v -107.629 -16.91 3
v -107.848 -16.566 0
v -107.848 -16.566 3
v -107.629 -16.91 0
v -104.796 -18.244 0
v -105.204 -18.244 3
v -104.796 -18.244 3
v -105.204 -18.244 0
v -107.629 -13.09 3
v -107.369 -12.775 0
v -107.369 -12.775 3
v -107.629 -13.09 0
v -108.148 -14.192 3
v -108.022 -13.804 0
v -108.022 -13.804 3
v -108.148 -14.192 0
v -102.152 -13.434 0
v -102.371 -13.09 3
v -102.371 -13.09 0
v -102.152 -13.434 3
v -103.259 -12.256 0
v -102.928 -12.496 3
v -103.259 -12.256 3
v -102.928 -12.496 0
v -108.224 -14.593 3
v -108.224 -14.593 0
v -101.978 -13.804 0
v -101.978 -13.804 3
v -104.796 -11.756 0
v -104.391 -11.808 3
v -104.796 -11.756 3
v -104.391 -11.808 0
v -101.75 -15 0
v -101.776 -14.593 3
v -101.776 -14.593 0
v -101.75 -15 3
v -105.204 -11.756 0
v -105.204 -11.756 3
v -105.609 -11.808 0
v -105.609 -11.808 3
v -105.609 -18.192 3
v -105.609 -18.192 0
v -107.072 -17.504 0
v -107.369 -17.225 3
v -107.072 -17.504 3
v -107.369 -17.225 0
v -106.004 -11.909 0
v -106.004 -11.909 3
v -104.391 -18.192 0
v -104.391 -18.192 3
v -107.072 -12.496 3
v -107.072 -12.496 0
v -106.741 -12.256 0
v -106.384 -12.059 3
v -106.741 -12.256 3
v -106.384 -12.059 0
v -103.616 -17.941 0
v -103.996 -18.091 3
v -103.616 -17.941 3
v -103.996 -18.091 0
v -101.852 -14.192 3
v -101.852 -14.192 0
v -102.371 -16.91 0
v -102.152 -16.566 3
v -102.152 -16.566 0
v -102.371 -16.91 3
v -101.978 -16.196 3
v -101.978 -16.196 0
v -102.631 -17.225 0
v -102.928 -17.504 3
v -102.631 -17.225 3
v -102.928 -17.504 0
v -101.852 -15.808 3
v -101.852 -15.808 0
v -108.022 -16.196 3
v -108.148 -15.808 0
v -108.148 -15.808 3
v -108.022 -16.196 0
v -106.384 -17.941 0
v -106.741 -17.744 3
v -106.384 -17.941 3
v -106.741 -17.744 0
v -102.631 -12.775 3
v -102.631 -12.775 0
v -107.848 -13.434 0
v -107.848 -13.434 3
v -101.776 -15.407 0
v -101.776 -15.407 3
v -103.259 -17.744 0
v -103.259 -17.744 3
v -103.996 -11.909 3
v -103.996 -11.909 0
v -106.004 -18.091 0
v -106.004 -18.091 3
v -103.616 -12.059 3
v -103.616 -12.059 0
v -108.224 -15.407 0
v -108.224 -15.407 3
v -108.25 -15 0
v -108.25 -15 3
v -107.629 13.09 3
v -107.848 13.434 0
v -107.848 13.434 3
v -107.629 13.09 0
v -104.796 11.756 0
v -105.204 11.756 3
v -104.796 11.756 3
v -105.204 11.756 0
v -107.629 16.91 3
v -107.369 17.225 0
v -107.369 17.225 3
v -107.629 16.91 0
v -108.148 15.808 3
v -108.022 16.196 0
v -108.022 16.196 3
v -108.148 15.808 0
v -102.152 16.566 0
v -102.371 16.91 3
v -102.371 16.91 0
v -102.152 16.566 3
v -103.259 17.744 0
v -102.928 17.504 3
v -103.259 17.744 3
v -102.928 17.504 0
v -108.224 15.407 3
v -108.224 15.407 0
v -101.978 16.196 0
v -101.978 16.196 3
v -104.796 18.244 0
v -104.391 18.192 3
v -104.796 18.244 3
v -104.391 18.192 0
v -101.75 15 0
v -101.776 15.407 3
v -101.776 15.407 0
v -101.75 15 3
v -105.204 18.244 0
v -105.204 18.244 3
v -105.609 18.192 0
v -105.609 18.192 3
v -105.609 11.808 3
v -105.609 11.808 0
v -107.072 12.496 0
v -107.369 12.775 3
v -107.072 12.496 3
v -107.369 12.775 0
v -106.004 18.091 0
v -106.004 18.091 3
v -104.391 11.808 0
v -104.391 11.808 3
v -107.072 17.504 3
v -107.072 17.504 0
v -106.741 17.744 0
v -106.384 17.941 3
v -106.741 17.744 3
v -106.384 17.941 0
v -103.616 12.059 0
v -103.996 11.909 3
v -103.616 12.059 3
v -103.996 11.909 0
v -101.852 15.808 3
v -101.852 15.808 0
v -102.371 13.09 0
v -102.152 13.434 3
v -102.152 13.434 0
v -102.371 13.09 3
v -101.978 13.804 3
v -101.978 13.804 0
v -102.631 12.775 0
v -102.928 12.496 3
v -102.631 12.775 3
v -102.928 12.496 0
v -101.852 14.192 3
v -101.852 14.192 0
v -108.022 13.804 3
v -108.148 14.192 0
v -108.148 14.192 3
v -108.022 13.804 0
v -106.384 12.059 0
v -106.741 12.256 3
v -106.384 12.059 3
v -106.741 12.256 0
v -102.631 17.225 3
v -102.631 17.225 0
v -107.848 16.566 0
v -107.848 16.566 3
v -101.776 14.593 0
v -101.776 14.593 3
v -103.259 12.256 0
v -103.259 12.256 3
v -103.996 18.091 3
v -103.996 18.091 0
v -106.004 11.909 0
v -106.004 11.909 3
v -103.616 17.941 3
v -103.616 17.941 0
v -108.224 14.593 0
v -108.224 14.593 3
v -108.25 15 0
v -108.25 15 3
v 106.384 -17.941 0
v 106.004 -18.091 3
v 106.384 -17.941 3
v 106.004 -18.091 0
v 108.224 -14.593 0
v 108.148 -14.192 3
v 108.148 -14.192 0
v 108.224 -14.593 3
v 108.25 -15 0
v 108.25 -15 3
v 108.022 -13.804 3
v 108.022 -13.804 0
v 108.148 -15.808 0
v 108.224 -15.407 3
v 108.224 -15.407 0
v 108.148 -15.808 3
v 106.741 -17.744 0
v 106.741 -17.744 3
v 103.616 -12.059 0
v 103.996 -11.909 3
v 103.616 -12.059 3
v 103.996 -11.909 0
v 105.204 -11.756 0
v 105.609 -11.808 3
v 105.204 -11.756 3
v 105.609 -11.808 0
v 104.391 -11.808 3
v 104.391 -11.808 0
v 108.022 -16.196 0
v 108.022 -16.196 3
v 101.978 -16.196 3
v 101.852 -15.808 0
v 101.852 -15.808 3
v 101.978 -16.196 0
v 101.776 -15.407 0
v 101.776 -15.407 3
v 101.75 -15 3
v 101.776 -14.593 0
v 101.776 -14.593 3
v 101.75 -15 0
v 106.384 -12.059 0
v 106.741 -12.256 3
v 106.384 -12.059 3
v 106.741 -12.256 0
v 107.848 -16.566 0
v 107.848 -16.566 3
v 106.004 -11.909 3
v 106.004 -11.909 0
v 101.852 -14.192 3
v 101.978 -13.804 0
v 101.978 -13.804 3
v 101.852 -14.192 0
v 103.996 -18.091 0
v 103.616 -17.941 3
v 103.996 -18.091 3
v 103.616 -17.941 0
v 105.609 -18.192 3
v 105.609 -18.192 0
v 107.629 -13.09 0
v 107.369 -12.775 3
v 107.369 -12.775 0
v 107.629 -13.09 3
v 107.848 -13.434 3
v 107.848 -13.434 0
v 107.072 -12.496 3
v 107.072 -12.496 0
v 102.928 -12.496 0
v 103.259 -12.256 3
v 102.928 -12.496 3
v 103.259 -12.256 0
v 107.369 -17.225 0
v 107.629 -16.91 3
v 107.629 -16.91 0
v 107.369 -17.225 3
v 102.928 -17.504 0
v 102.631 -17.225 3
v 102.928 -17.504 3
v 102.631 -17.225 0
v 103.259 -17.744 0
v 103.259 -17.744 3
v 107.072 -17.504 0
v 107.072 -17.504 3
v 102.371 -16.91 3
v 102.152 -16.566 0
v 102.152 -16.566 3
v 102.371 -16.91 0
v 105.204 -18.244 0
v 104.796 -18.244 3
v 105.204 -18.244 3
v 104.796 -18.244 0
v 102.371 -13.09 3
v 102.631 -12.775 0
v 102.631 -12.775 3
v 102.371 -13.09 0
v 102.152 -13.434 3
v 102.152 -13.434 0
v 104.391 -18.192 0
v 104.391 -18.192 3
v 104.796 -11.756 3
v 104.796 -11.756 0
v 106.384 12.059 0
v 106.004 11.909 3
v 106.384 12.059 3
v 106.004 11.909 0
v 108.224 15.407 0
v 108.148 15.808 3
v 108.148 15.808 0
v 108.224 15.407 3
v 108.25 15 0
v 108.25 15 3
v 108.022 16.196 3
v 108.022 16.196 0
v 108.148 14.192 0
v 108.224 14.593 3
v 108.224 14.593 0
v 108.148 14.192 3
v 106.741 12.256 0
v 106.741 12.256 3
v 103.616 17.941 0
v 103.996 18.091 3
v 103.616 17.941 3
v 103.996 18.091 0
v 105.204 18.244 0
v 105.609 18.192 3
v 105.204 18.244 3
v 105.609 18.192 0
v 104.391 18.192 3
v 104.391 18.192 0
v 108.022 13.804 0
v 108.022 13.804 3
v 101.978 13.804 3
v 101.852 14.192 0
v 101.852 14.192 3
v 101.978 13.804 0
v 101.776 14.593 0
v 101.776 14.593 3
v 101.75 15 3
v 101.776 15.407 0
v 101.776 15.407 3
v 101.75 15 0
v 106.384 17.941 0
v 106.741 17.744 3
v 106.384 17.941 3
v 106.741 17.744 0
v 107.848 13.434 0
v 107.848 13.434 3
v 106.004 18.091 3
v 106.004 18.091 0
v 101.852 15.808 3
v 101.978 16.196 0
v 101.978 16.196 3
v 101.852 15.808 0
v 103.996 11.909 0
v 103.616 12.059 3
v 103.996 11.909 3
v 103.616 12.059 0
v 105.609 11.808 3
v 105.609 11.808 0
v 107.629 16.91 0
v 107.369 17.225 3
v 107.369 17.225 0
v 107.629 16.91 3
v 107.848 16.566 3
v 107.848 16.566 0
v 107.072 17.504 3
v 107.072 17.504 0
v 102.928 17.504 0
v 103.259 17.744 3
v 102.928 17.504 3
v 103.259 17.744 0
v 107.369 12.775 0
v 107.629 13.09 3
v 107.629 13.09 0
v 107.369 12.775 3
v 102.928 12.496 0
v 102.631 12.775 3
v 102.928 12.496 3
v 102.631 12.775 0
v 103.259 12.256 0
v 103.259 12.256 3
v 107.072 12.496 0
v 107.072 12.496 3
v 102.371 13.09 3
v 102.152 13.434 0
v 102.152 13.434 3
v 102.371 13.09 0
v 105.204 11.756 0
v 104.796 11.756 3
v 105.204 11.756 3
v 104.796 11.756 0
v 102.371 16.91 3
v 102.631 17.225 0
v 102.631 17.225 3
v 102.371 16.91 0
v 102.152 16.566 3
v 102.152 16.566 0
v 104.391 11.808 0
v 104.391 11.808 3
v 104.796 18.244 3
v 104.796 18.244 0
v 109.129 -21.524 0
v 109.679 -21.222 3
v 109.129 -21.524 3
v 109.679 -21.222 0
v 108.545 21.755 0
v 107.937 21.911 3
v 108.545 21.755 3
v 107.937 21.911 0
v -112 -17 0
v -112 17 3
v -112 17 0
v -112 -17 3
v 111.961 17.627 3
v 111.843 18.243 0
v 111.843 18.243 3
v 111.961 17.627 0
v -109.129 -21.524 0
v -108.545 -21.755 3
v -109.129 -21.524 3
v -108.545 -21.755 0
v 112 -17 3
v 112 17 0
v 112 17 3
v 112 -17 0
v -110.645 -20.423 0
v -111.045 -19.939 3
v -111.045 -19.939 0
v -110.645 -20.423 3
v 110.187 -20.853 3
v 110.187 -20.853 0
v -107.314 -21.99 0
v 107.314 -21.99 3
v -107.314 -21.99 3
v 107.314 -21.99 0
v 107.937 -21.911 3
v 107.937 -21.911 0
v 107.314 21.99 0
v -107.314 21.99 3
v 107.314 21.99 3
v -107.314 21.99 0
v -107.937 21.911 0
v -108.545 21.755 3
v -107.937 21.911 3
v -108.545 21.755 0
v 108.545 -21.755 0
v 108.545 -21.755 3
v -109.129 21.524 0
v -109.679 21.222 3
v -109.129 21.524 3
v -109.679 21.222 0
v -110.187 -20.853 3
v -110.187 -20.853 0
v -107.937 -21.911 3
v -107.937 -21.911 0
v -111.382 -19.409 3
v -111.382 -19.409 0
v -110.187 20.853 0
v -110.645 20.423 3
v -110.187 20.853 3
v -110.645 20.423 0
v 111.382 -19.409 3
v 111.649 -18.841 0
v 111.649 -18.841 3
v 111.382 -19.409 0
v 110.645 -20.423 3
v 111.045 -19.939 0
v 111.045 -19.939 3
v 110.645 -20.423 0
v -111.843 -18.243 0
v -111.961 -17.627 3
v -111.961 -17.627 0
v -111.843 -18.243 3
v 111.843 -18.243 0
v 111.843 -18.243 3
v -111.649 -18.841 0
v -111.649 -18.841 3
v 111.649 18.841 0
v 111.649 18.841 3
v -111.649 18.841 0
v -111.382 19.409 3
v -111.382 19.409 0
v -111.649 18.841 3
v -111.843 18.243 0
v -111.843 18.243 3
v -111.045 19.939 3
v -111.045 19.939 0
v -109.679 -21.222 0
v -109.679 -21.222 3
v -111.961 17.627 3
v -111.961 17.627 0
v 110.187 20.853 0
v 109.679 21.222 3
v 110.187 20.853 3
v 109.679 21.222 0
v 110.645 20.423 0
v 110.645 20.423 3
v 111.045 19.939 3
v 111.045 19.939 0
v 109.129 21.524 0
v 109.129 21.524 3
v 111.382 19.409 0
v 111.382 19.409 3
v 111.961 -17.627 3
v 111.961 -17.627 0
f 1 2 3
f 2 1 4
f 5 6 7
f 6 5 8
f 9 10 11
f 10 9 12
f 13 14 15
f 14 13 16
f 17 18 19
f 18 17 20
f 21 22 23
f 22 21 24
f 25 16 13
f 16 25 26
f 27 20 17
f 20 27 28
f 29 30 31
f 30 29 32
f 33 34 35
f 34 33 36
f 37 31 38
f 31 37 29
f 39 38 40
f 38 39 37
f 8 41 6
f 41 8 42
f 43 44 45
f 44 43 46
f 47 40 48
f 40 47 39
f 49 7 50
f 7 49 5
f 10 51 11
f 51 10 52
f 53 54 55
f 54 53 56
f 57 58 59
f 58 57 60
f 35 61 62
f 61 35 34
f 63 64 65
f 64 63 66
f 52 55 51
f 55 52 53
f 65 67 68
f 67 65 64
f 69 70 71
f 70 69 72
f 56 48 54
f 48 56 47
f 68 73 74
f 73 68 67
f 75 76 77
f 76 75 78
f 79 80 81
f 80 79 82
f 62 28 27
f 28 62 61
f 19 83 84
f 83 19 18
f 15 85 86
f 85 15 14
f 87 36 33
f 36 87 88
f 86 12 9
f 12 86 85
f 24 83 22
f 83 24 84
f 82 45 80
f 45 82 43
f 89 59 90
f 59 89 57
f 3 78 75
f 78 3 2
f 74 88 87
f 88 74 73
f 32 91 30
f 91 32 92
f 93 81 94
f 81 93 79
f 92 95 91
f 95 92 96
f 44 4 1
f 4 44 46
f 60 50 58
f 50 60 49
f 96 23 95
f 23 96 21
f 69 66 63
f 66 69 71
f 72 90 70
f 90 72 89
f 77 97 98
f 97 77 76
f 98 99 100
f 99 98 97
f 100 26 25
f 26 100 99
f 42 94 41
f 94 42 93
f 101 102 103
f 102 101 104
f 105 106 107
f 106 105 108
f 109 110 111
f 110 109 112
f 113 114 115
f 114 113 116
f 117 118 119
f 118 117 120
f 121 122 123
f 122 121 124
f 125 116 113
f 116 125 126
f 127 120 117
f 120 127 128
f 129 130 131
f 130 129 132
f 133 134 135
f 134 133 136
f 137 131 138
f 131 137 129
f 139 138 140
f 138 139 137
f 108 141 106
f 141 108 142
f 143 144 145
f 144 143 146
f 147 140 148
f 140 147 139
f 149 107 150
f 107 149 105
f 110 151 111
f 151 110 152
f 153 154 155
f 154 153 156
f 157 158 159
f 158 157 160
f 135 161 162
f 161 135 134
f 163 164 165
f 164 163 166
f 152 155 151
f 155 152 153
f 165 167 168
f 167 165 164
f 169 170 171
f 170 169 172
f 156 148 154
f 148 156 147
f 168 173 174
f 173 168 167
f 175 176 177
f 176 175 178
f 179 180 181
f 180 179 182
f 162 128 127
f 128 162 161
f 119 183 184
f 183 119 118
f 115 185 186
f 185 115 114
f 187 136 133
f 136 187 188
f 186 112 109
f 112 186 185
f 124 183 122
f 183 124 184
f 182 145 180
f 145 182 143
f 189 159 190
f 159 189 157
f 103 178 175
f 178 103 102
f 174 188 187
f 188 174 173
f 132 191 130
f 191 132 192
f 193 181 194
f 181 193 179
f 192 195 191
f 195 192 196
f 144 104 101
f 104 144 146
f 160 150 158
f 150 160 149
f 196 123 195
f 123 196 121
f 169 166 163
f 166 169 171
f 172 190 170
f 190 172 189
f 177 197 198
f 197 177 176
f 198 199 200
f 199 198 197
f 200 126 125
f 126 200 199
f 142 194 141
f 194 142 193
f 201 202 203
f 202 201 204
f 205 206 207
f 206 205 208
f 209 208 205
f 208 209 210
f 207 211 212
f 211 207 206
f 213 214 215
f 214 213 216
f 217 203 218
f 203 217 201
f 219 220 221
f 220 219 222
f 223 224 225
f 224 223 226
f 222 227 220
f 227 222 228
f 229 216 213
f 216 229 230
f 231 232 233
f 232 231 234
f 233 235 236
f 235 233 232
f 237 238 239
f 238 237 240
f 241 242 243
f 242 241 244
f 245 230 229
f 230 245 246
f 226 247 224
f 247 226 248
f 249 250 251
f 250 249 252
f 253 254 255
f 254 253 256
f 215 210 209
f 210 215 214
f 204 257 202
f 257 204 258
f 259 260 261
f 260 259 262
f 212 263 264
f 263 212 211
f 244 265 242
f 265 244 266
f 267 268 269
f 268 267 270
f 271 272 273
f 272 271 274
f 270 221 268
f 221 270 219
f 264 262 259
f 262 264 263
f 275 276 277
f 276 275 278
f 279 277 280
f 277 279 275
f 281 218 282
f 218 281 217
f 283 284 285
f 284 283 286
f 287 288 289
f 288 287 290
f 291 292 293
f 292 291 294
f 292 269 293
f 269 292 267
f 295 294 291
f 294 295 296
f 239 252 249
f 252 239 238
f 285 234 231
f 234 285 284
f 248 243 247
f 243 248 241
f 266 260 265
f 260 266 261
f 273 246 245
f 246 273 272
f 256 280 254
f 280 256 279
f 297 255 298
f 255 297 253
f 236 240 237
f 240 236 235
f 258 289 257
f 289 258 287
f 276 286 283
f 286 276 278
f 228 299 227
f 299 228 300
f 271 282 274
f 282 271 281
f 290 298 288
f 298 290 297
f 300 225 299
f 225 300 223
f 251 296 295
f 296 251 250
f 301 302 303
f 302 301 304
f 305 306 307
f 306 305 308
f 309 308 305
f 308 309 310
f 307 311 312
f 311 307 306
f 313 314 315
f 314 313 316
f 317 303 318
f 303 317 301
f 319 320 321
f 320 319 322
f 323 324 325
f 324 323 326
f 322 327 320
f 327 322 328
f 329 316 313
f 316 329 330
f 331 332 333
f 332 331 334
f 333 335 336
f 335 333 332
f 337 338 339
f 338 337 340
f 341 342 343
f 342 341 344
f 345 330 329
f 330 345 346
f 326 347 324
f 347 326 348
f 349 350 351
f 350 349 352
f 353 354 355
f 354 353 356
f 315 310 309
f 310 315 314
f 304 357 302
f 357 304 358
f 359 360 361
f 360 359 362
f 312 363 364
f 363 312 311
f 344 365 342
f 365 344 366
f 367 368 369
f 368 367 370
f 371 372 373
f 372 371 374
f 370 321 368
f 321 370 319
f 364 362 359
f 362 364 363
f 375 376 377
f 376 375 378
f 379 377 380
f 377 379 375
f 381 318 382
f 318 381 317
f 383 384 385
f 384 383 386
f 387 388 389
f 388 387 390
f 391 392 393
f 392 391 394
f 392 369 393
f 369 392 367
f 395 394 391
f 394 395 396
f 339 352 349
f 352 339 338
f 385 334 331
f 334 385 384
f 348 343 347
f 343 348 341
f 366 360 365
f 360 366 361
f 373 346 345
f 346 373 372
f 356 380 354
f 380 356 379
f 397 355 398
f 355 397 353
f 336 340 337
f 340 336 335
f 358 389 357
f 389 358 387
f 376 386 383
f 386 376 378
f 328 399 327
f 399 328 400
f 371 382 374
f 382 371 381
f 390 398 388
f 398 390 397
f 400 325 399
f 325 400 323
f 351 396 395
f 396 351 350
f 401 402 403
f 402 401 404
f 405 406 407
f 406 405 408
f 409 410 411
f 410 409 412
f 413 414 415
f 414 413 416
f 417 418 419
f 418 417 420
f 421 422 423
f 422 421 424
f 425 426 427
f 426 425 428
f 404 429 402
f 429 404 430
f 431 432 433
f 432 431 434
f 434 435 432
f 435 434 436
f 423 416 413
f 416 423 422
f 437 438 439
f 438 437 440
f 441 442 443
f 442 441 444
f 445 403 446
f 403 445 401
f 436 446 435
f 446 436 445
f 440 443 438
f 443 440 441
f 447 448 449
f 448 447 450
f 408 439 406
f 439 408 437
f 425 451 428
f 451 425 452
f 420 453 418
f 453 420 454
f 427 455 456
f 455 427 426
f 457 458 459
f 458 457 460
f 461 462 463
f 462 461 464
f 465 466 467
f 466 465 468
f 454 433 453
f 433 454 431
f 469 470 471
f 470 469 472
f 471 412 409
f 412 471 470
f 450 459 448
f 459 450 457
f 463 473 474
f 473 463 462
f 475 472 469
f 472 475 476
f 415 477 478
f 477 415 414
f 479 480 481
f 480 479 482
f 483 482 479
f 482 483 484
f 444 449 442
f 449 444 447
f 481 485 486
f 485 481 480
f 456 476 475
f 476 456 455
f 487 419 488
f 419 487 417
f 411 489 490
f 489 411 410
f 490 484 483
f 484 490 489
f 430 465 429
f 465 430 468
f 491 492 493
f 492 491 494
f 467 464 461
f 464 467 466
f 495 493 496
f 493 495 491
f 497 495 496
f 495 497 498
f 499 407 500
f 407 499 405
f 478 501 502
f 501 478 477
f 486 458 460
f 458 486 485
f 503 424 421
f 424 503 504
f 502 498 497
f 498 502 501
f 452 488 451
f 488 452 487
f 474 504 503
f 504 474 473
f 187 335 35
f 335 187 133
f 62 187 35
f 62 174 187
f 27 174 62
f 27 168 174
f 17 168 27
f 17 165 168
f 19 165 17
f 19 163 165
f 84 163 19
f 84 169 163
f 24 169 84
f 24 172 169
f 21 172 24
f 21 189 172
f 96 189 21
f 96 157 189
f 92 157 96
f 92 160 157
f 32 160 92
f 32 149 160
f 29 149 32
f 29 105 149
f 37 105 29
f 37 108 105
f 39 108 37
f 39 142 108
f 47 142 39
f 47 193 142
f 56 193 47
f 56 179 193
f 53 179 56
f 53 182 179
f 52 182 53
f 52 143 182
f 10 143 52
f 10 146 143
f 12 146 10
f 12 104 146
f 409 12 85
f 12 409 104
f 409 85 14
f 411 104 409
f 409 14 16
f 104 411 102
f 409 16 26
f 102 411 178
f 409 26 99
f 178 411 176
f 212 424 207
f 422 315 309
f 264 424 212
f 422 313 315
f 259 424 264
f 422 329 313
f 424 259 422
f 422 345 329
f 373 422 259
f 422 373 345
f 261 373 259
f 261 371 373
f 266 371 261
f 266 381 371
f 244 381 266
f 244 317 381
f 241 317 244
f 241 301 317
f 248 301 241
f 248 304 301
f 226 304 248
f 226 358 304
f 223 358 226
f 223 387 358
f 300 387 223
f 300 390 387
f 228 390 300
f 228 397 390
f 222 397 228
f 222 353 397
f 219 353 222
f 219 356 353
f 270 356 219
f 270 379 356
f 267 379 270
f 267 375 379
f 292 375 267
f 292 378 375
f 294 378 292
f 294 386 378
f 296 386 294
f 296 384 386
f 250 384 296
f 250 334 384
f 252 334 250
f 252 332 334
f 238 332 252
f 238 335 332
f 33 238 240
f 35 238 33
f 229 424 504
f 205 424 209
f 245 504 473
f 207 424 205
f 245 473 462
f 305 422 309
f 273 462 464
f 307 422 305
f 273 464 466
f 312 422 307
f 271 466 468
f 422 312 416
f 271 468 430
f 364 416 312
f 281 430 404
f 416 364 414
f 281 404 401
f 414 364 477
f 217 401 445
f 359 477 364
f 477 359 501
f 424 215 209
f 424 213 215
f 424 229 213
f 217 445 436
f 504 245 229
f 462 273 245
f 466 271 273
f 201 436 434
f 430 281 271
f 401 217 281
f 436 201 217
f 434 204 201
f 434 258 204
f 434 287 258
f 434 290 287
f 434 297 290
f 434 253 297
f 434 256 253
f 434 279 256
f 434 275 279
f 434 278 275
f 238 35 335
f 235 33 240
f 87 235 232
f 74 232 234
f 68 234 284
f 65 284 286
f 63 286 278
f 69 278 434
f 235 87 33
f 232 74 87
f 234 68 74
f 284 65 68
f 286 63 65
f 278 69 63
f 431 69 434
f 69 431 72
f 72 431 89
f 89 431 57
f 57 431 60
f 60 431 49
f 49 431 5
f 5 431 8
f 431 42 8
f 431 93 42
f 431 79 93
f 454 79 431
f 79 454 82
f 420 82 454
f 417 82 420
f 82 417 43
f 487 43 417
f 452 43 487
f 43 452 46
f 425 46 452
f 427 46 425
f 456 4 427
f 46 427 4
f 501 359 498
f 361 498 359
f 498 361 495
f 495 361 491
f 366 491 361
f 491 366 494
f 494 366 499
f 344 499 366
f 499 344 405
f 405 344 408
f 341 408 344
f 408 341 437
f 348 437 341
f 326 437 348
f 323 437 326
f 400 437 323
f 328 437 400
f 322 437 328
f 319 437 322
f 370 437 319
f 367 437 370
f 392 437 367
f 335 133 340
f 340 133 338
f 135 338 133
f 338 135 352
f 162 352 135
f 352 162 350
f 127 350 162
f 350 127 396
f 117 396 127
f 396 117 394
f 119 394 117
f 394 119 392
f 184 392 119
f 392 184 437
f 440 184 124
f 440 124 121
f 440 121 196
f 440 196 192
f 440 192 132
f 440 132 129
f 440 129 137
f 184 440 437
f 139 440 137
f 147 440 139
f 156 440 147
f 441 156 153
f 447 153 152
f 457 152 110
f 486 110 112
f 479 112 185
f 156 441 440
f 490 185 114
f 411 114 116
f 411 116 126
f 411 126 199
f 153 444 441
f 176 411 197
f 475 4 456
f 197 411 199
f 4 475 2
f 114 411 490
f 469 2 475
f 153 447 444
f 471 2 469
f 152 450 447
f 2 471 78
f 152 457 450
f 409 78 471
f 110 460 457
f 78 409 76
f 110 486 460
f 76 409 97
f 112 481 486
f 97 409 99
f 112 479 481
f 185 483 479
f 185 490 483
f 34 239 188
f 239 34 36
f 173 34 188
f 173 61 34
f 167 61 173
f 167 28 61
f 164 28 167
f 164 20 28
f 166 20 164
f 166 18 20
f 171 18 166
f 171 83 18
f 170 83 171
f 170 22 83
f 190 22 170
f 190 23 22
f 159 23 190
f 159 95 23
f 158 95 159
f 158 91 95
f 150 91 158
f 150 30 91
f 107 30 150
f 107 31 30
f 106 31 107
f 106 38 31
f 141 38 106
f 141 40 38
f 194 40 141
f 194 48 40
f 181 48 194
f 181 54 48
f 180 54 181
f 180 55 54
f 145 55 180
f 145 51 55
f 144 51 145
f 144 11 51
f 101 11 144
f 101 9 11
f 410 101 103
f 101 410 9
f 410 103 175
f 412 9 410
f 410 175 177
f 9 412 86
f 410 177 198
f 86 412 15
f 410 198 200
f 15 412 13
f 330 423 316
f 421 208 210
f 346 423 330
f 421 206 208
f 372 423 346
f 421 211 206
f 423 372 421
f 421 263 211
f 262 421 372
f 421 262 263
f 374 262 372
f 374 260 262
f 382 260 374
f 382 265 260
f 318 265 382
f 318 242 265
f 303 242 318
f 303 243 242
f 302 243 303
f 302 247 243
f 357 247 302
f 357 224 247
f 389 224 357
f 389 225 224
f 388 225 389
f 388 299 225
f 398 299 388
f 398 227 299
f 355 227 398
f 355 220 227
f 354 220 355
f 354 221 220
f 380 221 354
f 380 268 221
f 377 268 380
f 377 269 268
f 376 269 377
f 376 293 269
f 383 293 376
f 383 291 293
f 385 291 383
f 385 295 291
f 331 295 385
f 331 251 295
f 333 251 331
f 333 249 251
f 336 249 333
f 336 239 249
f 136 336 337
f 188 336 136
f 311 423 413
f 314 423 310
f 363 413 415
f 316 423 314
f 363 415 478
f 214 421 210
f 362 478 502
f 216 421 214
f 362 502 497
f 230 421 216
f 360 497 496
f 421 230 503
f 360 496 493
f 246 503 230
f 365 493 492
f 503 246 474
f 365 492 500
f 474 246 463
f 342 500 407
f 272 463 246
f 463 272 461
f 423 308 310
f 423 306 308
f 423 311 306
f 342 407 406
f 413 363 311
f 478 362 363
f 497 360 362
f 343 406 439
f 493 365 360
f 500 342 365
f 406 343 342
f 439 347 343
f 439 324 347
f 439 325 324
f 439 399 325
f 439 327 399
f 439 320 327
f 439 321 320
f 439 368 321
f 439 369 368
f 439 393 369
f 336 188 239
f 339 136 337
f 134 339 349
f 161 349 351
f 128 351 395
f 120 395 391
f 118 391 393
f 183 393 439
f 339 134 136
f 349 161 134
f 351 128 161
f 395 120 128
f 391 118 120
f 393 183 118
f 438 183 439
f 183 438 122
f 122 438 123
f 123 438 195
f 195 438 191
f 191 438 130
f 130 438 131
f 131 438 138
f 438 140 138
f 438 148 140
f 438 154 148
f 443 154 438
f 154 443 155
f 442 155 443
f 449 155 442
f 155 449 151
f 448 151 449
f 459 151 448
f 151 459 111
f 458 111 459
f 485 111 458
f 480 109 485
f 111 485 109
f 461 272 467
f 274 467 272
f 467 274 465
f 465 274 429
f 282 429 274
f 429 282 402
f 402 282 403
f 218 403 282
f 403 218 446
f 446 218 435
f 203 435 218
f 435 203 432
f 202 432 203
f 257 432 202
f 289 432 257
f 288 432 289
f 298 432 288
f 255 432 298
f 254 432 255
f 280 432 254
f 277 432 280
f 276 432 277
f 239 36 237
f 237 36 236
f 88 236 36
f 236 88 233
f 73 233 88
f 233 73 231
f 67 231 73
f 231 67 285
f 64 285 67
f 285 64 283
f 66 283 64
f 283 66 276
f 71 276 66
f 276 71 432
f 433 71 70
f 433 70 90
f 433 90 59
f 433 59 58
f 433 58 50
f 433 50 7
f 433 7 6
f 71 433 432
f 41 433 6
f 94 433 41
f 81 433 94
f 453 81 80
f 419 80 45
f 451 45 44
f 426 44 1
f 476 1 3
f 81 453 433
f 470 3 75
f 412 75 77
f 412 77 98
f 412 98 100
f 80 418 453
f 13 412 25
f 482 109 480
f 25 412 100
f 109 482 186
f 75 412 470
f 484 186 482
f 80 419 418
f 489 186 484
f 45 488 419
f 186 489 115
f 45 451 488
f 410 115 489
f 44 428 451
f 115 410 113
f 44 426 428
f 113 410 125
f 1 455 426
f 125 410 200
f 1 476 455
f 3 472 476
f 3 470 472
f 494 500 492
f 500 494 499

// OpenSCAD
$fn = 50;


difference() {
	union() {
		hull() {
			translate(v = [-107.0000000000, 17.0000000000, 0]) {
				cylinder(h = 3, r = 5);
			}
			translate(v = [107.0000000000, 17.0000000000, 0]) {
				cylinder(h = 3, r = 5);
			}
			translate(v = [-107.0000000000, -17.0000000000, 0]) {
				cylinder(h = 3, r = 5);
			}
			translate(v = [107.0000000000, -17.0000000000, 0]) {
				cylinder(h = 3, r = 5);
			}
		}
	}
	union() {
		translate(v = [-105.0000000000, -15.0000000000, -100.0000000000]) {
			cylinder(h = 200, r = 3.2500000000);
		}
		translate(v = [-105.0000000000, 15.0000000000, -100.0000000000]) {
			cylinder(h = 200, r = 3.2500000000);
		}
		translate(v = [105.0000000000, -15.0000000000, -100.0000000000]) {
			cylinder(h = 200, r = 3.2500000000);
		}
		translate(v = [105.0000000000, 15.0000000000, -100.0000000000]) {
			cylinder(h = 200, r = 3.2500000000);
		}
	}
}
